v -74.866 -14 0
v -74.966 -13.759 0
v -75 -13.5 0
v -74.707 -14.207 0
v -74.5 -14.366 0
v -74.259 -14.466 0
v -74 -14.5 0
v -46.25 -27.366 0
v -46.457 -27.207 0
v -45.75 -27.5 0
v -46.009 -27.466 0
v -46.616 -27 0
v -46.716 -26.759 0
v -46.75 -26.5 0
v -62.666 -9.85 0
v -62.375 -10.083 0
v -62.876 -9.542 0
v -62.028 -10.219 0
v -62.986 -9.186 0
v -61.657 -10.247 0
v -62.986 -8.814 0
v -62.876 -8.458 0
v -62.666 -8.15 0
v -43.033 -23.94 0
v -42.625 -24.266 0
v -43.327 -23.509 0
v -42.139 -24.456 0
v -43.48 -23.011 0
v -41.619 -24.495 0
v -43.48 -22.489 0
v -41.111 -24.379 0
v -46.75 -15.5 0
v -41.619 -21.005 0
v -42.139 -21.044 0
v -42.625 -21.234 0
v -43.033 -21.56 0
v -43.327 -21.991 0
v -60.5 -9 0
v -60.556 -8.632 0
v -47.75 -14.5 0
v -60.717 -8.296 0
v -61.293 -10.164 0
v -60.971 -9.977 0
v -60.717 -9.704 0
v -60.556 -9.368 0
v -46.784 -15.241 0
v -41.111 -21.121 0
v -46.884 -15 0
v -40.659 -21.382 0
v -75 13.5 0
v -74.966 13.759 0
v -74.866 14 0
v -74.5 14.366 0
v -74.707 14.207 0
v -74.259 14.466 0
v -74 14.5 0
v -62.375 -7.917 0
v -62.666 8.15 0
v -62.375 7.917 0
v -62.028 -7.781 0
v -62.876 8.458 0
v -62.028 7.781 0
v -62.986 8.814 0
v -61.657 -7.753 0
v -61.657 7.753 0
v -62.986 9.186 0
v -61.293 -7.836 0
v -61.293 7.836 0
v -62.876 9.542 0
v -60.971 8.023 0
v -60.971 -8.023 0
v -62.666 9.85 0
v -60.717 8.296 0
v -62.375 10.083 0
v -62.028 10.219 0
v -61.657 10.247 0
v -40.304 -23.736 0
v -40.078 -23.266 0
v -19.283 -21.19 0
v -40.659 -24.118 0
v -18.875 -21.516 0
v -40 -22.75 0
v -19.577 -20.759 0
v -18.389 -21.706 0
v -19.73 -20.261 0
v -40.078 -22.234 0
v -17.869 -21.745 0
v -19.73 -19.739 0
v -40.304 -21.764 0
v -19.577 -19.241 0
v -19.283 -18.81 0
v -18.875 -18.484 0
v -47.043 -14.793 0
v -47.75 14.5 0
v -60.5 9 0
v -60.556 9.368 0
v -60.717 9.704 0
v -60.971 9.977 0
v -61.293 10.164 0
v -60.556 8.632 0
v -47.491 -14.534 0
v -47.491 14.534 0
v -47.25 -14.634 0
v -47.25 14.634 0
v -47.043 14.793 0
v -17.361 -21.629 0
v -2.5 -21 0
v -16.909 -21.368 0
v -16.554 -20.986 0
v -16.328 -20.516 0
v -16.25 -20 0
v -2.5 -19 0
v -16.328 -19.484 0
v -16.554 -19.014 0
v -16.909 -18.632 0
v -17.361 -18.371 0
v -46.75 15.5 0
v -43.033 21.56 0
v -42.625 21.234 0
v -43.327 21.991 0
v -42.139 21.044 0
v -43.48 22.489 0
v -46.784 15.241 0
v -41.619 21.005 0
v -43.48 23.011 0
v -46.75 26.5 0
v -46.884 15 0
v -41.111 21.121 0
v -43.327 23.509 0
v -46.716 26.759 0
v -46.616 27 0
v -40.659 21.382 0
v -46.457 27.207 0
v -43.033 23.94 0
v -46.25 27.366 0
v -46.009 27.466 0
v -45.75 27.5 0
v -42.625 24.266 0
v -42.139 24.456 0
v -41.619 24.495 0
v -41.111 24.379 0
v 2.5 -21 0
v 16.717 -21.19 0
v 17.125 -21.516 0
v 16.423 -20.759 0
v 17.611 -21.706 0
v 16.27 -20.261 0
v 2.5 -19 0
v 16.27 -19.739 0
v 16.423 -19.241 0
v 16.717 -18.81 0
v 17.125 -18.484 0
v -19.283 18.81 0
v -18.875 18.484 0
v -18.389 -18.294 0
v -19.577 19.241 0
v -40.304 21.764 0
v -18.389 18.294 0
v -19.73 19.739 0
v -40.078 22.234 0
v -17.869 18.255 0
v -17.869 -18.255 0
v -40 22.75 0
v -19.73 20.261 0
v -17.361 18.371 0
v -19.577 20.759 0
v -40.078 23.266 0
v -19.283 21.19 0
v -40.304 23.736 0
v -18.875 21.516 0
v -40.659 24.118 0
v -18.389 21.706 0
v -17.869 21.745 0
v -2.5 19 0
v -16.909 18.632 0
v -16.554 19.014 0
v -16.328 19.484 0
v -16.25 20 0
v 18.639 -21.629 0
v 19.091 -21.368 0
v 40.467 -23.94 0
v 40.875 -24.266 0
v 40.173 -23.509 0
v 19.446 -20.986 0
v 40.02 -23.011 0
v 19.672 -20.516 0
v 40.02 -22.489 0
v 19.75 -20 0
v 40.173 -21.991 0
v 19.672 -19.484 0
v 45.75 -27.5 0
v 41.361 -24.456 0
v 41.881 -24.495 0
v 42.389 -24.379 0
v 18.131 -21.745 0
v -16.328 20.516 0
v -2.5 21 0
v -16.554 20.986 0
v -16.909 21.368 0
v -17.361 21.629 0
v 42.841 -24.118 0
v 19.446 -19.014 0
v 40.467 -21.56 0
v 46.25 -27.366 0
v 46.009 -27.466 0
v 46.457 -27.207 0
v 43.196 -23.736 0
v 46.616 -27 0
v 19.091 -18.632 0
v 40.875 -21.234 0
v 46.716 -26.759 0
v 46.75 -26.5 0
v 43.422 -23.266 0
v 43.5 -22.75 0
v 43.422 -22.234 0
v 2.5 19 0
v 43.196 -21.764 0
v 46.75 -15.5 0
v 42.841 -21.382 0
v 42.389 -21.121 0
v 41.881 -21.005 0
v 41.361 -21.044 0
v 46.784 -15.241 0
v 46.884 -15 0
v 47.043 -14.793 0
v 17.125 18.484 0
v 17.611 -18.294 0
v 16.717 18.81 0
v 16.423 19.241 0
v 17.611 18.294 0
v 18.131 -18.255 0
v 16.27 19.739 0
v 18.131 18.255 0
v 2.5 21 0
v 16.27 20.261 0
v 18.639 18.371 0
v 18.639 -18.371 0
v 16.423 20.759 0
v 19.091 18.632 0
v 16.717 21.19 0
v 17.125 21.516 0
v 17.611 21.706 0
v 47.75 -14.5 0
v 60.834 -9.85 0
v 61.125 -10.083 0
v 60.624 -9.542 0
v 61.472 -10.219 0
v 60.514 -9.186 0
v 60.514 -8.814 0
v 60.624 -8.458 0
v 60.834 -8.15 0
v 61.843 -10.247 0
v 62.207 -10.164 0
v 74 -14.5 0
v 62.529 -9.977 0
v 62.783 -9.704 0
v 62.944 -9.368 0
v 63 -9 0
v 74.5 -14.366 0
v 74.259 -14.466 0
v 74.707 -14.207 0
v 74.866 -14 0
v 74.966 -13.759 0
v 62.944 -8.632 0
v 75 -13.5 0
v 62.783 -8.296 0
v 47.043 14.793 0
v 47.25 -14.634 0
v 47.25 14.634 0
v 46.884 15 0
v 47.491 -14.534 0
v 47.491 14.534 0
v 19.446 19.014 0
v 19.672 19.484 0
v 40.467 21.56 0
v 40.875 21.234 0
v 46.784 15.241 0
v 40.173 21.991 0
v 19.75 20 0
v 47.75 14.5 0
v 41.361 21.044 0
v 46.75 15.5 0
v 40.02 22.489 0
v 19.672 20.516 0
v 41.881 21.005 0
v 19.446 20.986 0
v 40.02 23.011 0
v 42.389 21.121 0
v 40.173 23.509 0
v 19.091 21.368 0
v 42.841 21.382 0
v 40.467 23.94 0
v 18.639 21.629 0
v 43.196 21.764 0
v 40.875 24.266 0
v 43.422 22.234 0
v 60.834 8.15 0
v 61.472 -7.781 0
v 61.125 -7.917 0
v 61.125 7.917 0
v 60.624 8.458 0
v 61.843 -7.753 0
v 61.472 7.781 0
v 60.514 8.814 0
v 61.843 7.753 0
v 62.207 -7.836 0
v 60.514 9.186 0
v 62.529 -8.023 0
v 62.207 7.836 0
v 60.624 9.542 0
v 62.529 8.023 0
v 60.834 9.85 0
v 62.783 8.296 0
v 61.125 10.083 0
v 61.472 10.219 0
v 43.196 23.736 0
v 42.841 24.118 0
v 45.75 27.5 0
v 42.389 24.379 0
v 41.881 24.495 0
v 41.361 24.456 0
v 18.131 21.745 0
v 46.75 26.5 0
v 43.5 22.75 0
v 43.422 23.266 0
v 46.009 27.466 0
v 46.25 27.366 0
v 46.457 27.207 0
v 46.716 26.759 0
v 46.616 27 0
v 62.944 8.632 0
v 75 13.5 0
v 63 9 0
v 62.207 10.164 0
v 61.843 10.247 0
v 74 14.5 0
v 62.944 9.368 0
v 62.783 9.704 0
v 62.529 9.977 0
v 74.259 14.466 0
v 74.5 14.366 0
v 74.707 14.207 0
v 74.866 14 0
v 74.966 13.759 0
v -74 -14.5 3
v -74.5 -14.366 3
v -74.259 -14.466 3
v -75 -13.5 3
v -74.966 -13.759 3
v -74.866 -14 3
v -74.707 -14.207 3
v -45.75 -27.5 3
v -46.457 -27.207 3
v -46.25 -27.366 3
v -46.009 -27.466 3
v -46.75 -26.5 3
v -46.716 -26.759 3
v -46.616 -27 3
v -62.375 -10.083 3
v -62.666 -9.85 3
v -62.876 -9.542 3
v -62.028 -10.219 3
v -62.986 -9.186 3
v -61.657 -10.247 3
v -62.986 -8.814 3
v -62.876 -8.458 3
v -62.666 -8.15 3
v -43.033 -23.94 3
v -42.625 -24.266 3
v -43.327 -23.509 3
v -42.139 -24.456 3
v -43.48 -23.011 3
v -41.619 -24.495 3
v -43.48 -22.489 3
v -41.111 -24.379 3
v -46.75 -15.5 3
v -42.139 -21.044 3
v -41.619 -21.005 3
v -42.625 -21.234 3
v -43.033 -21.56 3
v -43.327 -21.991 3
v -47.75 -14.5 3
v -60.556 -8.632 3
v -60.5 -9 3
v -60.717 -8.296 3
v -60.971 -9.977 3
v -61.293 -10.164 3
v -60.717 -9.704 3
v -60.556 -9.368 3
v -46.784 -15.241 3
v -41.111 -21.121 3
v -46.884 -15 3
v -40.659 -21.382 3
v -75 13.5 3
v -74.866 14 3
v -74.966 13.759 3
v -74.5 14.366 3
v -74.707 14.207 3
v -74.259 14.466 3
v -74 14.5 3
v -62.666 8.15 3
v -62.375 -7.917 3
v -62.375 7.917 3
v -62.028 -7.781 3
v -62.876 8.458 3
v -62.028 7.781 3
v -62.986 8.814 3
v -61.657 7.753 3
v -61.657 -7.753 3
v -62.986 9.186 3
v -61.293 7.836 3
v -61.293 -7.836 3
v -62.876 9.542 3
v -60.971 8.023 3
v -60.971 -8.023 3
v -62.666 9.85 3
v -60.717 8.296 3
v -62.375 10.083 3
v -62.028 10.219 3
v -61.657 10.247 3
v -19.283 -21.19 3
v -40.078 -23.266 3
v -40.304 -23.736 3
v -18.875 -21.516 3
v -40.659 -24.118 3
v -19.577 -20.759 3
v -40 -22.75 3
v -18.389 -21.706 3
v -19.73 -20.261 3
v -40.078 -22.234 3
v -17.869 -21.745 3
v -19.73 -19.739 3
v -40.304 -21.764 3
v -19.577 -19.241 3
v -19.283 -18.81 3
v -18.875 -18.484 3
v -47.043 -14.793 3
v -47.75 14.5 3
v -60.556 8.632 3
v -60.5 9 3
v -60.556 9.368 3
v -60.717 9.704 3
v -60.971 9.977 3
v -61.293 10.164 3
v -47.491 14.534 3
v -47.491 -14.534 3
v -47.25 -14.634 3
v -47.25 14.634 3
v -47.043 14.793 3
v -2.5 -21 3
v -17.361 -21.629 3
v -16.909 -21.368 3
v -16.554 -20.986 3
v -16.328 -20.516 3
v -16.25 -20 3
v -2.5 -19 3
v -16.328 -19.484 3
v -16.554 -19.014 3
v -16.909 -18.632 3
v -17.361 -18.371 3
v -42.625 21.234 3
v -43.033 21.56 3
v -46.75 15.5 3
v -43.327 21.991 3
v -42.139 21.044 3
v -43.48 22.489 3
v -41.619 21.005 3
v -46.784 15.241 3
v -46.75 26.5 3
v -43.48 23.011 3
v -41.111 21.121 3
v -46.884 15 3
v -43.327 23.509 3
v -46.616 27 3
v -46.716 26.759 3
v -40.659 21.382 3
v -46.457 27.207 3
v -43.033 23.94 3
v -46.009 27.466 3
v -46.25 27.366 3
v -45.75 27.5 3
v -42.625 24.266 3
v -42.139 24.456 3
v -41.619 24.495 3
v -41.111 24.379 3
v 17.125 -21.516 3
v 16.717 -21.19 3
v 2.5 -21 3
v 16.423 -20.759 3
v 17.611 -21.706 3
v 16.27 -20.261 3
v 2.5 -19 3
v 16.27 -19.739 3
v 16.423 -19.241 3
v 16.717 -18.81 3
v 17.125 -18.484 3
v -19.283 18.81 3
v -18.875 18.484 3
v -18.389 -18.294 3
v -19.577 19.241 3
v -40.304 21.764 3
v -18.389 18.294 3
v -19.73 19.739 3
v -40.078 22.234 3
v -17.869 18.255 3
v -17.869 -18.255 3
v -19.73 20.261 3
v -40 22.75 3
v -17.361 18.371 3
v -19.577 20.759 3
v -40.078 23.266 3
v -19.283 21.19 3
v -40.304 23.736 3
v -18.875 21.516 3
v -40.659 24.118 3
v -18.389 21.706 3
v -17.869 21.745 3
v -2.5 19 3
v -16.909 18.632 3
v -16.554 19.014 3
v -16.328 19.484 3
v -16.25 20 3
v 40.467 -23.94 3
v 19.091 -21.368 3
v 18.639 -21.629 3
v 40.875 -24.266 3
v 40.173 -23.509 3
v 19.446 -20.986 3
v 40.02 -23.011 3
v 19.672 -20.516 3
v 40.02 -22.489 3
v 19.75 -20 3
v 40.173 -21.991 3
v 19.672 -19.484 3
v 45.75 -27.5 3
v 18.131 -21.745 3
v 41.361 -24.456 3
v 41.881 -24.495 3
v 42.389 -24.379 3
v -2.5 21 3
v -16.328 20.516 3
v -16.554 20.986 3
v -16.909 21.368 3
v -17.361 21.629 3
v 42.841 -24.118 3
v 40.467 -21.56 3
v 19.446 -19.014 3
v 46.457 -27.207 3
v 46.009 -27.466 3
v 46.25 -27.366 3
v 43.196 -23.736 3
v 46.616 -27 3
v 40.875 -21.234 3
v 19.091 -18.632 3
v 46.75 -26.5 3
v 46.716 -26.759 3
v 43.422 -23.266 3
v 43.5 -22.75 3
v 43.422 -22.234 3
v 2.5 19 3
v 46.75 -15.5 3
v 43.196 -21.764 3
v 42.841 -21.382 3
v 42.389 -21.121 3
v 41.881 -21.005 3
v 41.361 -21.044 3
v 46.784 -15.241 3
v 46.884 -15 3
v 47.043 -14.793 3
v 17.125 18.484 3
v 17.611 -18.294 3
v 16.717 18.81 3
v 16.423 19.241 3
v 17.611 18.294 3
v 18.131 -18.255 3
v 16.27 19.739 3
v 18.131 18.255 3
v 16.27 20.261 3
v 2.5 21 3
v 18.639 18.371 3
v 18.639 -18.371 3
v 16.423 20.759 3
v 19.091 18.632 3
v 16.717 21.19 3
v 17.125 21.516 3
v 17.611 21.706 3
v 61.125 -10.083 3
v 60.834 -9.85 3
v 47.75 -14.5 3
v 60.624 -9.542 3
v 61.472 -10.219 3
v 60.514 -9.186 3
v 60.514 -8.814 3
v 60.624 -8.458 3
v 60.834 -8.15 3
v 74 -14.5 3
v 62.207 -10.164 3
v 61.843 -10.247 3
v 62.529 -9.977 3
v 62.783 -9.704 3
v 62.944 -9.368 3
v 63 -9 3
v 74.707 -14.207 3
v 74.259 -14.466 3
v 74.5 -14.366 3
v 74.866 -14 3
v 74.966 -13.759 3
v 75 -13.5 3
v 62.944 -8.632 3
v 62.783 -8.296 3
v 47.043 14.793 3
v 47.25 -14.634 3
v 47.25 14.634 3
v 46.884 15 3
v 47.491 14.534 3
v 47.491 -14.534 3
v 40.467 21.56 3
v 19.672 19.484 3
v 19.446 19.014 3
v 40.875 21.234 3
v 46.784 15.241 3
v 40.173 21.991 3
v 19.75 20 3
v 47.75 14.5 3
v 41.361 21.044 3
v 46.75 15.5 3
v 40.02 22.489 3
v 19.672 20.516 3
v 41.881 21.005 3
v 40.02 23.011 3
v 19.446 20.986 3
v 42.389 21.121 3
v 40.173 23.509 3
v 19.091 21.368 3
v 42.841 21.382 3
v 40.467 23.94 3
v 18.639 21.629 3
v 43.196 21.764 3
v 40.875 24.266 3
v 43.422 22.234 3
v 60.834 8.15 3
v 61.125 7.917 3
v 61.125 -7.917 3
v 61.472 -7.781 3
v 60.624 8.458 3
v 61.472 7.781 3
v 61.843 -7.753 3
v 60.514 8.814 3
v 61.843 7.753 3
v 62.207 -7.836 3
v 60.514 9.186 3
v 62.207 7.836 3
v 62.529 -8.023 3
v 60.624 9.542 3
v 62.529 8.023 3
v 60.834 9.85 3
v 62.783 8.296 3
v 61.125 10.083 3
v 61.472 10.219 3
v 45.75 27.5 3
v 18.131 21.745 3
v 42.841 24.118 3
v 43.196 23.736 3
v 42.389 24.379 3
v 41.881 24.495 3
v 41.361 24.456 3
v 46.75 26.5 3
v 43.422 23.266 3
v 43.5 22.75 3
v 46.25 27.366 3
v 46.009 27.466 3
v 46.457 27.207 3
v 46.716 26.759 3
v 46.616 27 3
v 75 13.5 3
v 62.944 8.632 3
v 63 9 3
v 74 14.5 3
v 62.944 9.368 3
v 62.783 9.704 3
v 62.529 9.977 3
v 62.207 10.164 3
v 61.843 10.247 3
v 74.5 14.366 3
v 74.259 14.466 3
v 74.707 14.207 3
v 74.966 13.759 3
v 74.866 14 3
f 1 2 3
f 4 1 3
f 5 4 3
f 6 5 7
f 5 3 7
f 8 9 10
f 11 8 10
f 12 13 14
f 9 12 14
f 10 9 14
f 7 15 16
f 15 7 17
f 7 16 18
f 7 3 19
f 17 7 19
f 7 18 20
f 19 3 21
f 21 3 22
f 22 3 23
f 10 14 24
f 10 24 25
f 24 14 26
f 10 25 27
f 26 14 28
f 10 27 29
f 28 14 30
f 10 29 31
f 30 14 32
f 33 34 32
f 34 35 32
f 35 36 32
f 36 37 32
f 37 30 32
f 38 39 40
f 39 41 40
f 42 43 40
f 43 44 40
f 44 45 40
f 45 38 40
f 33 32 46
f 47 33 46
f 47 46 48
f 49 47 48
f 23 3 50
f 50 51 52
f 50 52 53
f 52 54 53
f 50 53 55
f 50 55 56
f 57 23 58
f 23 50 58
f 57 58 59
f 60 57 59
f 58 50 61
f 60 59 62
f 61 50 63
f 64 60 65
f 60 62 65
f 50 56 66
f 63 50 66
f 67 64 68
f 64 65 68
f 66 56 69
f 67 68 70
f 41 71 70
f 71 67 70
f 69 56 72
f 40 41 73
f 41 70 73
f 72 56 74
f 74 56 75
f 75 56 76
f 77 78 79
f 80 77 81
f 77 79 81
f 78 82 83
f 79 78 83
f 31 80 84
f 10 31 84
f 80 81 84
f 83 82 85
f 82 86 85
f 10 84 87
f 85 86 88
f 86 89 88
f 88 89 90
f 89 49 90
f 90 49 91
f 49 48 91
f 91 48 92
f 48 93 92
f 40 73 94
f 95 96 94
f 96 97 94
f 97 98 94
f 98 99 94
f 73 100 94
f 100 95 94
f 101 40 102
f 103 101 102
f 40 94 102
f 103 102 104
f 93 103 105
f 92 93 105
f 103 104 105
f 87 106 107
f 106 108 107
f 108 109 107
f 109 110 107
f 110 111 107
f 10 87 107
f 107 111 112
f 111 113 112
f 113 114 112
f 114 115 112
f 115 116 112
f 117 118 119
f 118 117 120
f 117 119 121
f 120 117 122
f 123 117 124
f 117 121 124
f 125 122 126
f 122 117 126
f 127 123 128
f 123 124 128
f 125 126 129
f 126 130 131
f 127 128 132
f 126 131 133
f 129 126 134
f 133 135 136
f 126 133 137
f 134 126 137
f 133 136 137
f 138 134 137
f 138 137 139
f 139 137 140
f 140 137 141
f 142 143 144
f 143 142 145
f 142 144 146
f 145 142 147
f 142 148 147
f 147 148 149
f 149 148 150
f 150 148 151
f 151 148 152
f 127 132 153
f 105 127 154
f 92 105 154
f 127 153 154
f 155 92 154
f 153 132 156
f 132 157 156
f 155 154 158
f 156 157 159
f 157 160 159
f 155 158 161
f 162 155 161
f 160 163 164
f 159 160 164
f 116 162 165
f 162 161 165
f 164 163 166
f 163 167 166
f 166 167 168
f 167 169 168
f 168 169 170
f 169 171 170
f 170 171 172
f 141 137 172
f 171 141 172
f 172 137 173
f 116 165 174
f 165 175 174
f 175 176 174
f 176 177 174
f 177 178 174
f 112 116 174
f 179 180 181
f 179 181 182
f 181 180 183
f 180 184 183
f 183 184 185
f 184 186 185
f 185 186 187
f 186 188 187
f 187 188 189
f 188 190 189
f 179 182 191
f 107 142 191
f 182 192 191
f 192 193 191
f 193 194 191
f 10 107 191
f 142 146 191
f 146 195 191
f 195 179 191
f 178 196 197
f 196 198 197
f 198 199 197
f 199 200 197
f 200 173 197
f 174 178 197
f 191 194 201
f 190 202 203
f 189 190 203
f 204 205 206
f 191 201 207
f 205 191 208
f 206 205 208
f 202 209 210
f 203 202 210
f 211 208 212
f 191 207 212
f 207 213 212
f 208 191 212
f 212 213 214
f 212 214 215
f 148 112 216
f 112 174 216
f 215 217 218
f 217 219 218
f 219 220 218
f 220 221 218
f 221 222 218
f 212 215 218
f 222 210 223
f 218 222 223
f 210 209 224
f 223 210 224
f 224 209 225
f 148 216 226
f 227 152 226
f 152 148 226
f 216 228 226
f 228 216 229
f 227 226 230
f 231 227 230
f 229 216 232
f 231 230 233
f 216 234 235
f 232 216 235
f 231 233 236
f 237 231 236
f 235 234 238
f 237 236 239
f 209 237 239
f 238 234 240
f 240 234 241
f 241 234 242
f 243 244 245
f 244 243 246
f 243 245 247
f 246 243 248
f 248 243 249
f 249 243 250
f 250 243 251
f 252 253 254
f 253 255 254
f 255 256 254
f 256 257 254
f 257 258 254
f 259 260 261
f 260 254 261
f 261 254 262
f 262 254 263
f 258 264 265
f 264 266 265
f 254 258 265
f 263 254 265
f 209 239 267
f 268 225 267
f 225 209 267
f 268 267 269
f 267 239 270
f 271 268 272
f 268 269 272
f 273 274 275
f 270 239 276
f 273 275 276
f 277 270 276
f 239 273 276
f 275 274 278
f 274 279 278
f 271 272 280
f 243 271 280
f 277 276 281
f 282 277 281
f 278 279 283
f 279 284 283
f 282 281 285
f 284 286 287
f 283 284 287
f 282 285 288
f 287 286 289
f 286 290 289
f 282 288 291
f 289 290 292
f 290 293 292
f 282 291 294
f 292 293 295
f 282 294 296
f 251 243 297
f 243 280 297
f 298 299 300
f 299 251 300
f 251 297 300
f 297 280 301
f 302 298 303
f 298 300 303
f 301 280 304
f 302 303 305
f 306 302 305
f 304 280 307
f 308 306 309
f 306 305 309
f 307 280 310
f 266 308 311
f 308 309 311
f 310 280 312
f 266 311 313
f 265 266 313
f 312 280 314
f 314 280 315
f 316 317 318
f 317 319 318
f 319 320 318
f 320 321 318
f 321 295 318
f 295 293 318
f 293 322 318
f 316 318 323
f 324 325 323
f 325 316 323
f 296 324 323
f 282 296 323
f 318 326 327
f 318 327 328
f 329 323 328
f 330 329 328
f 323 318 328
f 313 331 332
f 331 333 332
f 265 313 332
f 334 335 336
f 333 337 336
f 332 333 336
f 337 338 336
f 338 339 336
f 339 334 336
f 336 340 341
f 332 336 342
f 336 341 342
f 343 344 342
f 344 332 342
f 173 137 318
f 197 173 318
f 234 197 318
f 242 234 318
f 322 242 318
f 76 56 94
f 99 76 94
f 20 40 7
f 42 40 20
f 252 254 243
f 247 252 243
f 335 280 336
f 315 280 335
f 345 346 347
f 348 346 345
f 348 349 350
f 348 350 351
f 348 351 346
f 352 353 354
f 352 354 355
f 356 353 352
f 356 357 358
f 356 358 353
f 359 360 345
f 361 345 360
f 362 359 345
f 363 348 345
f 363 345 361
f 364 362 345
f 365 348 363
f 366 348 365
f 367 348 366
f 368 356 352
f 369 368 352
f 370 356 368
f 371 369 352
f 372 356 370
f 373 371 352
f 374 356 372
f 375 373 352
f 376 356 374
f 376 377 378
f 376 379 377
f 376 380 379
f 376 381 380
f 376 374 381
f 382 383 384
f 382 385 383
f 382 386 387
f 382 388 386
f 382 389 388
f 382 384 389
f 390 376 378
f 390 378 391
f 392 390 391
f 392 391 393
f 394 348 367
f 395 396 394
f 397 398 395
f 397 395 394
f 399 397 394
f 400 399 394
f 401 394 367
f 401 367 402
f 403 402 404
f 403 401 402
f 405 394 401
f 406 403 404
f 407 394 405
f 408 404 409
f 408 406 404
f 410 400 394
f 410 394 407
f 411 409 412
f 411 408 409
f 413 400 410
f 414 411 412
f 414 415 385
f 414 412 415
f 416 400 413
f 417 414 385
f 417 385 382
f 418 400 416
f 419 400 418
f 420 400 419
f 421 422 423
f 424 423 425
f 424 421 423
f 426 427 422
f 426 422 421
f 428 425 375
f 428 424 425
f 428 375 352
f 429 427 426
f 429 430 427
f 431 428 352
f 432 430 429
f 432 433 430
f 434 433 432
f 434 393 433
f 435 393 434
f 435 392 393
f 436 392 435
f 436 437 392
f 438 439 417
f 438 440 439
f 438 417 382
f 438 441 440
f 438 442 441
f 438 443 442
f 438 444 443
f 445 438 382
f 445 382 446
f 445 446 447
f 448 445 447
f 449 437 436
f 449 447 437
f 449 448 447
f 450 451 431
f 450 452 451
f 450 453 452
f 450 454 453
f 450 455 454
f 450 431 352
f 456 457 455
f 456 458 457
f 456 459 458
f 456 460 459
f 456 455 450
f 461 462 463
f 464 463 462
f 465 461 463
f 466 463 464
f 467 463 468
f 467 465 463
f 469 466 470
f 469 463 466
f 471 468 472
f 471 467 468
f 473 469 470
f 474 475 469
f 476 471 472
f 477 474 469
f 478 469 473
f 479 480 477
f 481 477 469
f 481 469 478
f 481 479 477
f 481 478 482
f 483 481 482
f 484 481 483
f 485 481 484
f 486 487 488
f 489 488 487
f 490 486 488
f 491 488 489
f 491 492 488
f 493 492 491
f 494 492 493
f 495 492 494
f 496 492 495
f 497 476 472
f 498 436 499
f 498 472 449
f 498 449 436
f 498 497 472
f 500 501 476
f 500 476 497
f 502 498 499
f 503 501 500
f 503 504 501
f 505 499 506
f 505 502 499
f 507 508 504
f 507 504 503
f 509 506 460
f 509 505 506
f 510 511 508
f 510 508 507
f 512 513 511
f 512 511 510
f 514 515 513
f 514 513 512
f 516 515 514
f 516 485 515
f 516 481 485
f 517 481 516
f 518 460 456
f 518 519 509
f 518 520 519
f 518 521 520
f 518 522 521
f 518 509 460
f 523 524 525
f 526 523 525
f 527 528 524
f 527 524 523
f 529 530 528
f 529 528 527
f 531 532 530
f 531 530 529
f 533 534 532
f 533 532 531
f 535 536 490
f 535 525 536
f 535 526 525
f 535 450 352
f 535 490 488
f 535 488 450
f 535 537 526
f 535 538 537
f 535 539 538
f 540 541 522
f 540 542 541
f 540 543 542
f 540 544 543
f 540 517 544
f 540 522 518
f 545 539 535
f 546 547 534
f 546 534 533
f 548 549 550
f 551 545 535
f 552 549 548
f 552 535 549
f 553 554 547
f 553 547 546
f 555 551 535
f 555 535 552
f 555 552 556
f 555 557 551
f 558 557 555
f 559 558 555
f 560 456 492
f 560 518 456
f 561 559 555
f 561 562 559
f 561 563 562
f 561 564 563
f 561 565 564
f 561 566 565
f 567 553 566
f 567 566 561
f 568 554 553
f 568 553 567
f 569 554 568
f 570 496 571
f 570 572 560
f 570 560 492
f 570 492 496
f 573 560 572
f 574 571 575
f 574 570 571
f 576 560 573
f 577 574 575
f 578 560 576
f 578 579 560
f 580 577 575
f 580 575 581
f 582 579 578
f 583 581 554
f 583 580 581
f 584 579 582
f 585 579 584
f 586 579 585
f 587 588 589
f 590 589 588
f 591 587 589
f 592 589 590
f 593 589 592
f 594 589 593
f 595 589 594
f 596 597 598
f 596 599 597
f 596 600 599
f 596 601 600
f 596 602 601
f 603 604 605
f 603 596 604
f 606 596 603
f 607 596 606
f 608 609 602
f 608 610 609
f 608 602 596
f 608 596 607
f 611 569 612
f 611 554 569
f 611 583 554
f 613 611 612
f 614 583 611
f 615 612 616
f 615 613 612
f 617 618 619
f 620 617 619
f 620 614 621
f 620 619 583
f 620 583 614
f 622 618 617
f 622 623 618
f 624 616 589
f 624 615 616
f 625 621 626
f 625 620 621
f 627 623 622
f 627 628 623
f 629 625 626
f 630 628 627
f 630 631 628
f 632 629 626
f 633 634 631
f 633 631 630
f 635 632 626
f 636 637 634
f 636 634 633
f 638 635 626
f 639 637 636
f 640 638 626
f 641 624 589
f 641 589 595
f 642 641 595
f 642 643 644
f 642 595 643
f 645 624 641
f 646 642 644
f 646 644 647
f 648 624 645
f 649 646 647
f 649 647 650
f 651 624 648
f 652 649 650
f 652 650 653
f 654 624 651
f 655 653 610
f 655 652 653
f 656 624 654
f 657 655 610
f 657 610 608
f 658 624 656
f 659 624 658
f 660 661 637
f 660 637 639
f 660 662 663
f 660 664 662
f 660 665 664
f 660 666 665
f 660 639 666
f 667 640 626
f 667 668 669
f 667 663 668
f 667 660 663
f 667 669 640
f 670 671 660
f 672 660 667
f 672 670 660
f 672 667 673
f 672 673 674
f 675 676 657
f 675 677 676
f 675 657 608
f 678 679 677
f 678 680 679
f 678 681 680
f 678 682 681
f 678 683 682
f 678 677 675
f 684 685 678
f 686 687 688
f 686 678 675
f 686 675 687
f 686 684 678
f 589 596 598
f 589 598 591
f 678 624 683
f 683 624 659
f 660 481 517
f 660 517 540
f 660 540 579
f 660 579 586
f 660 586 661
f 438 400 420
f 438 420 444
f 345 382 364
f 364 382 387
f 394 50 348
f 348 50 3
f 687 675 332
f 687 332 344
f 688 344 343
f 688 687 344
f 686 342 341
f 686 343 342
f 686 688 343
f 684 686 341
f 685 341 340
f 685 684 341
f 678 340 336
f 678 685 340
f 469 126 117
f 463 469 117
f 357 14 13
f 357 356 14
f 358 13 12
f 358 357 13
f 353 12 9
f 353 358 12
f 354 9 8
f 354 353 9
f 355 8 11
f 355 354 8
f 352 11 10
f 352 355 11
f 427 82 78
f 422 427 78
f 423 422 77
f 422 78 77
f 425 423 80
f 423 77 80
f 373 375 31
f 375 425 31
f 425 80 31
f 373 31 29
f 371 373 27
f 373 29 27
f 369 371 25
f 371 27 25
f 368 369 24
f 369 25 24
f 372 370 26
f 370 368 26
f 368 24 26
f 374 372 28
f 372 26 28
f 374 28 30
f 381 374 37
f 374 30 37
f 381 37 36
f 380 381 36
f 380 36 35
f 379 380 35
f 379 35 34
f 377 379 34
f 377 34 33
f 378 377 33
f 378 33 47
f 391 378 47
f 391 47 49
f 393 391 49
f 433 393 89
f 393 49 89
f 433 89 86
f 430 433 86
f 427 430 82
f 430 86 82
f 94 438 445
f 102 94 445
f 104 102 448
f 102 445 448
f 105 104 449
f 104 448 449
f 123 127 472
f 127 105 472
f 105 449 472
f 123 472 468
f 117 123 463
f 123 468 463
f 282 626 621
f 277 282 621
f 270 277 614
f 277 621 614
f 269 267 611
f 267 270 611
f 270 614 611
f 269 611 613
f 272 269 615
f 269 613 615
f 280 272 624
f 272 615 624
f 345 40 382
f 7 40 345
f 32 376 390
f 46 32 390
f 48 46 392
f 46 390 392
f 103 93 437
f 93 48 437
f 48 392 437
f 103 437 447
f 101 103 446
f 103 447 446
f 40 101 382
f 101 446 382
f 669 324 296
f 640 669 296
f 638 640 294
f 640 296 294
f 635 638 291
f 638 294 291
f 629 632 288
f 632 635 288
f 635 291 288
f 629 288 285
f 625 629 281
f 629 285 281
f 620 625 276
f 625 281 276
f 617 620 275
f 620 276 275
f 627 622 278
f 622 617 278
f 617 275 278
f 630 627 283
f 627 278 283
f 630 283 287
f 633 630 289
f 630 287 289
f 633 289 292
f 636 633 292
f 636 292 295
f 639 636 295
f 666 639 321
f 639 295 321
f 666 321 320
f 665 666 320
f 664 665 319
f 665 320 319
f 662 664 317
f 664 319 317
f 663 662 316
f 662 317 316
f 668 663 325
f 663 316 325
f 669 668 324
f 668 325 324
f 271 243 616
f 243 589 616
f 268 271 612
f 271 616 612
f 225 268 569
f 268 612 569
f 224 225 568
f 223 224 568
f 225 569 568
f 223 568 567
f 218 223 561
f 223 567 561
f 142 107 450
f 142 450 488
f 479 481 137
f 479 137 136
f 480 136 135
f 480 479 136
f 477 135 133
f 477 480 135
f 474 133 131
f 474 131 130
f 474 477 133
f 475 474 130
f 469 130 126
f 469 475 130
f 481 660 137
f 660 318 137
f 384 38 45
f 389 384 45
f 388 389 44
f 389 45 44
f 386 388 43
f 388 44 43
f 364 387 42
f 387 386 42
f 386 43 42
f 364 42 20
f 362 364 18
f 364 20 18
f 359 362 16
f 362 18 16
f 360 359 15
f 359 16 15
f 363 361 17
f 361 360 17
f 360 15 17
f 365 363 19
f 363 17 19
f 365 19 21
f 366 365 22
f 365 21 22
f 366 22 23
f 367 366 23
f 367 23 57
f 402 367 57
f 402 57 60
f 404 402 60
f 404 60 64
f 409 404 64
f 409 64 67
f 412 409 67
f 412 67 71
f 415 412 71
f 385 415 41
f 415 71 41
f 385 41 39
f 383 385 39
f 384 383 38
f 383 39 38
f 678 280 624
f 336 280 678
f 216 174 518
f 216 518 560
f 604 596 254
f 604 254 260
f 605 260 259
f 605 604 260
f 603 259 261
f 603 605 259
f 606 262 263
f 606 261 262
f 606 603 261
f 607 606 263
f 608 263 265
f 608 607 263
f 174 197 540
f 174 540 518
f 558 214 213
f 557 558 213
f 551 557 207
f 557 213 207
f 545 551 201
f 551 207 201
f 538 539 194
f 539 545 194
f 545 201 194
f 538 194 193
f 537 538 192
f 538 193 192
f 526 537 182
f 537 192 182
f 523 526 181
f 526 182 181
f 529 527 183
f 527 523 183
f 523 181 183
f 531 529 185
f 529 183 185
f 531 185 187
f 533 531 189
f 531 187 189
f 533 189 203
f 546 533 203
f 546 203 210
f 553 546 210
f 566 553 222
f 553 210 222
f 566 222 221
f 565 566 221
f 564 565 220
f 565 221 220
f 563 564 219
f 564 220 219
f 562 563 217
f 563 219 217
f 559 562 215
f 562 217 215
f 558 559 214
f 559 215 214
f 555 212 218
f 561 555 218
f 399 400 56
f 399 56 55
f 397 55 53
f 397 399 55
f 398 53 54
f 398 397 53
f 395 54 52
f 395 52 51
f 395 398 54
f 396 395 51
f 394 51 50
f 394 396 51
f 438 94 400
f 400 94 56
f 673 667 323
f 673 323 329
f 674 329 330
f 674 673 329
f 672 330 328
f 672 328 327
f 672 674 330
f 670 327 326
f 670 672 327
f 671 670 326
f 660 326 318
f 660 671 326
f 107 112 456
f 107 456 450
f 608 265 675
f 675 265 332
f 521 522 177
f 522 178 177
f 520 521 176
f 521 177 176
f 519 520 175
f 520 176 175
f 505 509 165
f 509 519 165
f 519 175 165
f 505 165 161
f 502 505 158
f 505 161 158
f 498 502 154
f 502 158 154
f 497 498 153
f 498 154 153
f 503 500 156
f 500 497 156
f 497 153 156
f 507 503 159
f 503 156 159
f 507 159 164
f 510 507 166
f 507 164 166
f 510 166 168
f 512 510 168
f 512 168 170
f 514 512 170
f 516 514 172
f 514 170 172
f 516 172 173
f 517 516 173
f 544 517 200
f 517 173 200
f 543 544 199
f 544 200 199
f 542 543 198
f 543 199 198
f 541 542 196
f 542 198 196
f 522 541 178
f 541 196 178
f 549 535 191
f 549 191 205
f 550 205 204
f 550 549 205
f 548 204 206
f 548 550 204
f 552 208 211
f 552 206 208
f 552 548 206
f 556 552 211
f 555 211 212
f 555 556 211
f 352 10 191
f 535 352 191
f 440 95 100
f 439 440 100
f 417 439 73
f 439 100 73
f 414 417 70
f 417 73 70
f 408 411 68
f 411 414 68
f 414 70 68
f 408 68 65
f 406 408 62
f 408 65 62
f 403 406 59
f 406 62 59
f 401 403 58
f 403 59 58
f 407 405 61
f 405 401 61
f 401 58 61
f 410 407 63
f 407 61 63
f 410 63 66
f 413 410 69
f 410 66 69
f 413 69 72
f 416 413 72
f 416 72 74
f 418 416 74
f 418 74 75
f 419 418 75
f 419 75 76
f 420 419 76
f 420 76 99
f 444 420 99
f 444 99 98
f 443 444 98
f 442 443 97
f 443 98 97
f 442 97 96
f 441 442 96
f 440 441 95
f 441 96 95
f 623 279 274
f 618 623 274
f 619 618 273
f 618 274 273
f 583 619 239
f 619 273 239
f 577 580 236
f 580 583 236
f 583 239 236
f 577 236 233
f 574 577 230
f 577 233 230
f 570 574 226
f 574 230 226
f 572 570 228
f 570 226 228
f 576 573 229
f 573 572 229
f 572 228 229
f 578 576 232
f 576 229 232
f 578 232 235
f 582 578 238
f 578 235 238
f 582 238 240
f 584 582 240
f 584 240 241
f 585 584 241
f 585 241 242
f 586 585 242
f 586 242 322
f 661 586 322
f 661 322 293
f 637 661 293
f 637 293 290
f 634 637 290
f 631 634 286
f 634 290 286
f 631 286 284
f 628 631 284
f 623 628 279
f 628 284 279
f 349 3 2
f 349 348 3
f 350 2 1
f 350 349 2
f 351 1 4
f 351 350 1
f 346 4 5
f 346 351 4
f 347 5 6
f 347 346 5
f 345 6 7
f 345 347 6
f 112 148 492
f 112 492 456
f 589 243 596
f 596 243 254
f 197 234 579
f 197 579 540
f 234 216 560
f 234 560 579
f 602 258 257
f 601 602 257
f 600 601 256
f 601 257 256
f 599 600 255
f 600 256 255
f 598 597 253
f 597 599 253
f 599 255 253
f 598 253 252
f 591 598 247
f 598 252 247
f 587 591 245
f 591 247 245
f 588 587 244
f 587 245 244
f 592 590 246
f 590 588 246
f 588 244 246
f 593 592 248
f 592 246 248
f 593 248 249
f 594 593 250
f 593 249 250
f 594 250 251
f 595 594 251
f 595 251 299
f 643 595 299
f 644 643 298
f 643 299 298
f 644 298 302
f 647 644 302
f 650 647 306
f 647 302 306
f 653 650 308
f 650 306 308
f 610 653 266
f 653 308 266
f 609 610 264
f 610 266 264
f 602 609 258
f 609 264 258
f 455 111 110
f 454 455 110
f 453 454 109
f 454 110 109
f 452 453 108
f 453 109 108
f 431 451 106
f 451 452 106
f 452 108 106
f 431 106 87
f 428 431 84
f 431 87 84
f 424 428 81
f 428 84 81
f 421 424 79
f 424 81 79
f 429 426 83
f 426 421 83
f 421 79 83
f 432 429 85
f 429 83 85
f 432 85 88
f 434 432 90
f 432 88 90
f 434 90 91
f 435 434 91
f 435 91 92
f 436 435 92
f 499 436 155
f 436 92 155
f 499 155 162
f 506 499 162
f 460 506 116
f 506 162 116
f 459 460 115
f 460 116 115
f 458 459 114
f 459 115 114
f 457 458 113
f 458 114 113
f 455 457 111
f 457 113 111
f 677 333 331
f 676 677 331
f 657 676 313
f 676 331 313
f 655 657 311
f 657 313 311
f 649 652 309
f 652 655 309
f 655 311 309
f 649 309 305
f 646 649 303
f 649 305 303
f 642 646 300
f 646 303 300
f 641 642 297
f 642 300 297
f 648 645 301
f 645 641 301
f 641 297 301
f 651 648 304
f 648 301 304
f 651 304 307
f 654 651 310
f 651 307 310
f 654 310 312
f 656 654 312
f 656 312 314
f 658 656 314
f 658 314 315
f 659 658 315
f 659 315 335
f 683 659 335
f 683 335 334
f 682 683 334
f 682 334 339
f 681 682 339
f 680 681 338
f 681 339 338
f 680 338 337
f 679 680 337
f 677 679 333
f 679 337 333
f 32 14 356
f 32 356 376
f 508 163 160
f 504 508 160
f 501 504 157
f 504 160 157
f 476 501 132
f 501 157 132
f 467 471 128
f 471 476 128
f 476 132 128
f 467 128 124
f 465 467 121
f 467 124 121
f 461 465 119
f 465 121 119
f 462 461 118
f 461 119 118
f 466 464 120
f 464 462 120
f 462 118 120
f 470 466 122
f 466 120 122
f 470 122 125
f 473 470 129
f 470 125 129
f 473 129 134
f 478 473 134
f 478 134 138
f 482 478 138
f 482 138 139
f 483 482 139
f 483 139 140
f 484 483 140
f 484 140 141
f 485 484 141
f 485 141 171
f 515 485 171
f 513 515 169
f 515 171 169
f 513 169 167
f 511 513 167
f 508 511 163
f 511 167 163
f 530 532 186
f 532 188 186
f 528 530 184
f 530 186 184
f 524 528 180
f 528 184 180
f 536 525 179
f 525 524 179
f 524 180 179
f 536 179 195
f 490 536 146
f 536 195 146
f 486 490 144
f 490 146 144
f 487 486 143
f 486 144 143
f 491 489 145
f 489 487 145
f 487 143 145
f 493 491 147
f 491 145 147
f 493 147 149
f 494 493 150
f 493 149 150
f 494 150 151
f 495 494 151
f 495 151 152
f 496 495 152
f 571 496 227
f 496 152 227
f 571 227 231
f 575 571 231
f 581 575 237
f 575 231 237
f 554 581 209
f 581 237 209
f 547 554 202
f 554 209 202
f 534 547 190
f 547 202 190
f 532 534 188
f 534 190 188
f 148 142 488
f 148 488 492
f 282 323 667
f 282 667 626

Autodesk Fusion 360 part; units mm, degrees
sketch "Sketch1" plane through (0, 0, 0) normal (0, 0, 1) x (1, 0, 0)
  line L0 (46.75, 27.5) -> (-46.75, 27.5)
  line L1 (-75, 14.5) -> (-75, -14.5)
  line L2 (-46.75, -27.5) -> (46.75, -27.5)
  line L3 (75, -14.5) -> (75, 14.5)
  line L4 (75, 27.5) -> (-75, -27.5) construction
  line L5 (-75, 27.5) -> (75, -27.5) construction
  line L6 (-46.75, 27.5) -> (-46.75, 14.5)
  line L7 (-46.75, 14.5) -> (-75, 14.5)
  line L8 (46.75, 27.5) -> (46.75, 14.5)
  line L9 (46.75, 14.5) -> (75, 14.5)
  line L10 (-46.75, -27.5) -> (-46.75, -14.5)
  line L11 (-46.75, -14.5) -> (-75, -14.5)
  line L12 (46.75, -27.5) -> (46.75, -14.5)
  line L13 (46.75, -14.5) -> (75, -14.5)
  circle A0 centre (-41.75, 22.75) radius 1.75
  circle A1 centre (41.75, 22.75) radius 1.75
  circle A2 centre (-41.75, -22.75) radius 1.75
  circle A3 centre (41.75, -22.75) radius 1.75
  circle A4 centre (-61.75, 9) radius 1.25
  circle A5 centre (-61.75, -9) radius 1.25
  circle A6 centre (61.75, 9) radius 1.25
  circle A7 centre (61.75, -9) radius 1.25
  circle A8 centre (-18, 20) radius 1.75
  circle A9 centre (18, 20) radius 1.75
  circle A10 centre (-18, -20) radius 1.75
  circle A11 centre (18, -20) radius 1.75
  line L14 (2.5, 21) -> (-2.5, 21)
  line L15 (-2.5, 21) -> (-2.5, 19)
  line L16 (-2.5, 19) -> (2.5, 19)
  line L17 (2.5, 19) -> (2.5, 21)
  line L18 (2.5, 21) -> (-2.5, 19) construction
  line L19 (-2.5, 21) -> (2.5, 19) construction
  line L20 (2.5, -19) -> (-2.5, -19)
  line L21 (-2.5, -19) -> (-2.5, -21)
  line L22 (-2.5, -21) -> (2.5, -21)
  line L23 (2.5, -21) -> (2.5, -19)
  line L24 (2.5, -19) -> (-2.5, -21) construction
  line L25 (-2.5, -19) -> (2.5, -21) construction
  point P0 (0, 20)
  point P1 (0, -20)
  dimension "d1" = 150
  dimension "d2" = 55
  dimension "d3" = 28.25
  dimension "d4" = 13
  dimension "d5" = 28.25
  dimension "d6" = 13
  dimension "d7" = 28.25
  dimension "d8" = 13
  dimension "d9" = 28.25
  dimension "d10" = 13
  dimension "d11" = 3.5
  dimension "d12" = 3.5
  dimension "d13" = 3.5
  dimension "d14" = 3.5
  dimension "d15" = 2.5
  dimension "d16" = 2.5
  dimension "d17" = 2.5
  dimension "d18" = 2.5
  dimension "d19" = 4.75
  dimension "d20" = 5
  dimension "d21" = 5
  dimension "d22" = 4.75
  dimension "d23" = 5
  dimension "d24" = 4.75
  dimension "d25" = 4.75
  dimension "d26" = 5
  dimension "d29" = 13.25
  dimension "d30" = 13.25
  dimension "d33" = 13.25
  dimension "d34" = 13.25
  dimension "d35" = 18
  dimension "d36" = 18
  dimension "d37" = 3.5
  dimension "d38" = 3.5
  dimension "d39" = 3.5
  dimension "d40" = 3.5
  dimension "d41" = 7.5
  dimension "d42" = 7.5
  dimension "d45" = 7.5
  dimension "d46" = 7.5
  dimension "d49" = 5
  dimension "d50" = 2
  dimension "d51" = 5
  dimension "d52" = 2
extrude "Extrude1" add sketch "Sketch1" along normal blind 3
fillet "Fillet1" radius 1 4 edges at (46.75, -27.5, 1.5) (46.75, -14.5, 1.5) (75, -14.5, 1.5) (75, 14.5, 1.5)
fillet "Fillet2" radius 1 8 edges at (46.75, 14.5, 1.5) (46.75, 27.5, 1.5) (-46.75, 27.5, 1.5) (-75, 14.5, 1.5) (-46.75, 14.5, 1.5) (-75, -14.5, 1.5) (-46.75, -27.5, 1.5) (-46.75, -14.5, 1.5)
